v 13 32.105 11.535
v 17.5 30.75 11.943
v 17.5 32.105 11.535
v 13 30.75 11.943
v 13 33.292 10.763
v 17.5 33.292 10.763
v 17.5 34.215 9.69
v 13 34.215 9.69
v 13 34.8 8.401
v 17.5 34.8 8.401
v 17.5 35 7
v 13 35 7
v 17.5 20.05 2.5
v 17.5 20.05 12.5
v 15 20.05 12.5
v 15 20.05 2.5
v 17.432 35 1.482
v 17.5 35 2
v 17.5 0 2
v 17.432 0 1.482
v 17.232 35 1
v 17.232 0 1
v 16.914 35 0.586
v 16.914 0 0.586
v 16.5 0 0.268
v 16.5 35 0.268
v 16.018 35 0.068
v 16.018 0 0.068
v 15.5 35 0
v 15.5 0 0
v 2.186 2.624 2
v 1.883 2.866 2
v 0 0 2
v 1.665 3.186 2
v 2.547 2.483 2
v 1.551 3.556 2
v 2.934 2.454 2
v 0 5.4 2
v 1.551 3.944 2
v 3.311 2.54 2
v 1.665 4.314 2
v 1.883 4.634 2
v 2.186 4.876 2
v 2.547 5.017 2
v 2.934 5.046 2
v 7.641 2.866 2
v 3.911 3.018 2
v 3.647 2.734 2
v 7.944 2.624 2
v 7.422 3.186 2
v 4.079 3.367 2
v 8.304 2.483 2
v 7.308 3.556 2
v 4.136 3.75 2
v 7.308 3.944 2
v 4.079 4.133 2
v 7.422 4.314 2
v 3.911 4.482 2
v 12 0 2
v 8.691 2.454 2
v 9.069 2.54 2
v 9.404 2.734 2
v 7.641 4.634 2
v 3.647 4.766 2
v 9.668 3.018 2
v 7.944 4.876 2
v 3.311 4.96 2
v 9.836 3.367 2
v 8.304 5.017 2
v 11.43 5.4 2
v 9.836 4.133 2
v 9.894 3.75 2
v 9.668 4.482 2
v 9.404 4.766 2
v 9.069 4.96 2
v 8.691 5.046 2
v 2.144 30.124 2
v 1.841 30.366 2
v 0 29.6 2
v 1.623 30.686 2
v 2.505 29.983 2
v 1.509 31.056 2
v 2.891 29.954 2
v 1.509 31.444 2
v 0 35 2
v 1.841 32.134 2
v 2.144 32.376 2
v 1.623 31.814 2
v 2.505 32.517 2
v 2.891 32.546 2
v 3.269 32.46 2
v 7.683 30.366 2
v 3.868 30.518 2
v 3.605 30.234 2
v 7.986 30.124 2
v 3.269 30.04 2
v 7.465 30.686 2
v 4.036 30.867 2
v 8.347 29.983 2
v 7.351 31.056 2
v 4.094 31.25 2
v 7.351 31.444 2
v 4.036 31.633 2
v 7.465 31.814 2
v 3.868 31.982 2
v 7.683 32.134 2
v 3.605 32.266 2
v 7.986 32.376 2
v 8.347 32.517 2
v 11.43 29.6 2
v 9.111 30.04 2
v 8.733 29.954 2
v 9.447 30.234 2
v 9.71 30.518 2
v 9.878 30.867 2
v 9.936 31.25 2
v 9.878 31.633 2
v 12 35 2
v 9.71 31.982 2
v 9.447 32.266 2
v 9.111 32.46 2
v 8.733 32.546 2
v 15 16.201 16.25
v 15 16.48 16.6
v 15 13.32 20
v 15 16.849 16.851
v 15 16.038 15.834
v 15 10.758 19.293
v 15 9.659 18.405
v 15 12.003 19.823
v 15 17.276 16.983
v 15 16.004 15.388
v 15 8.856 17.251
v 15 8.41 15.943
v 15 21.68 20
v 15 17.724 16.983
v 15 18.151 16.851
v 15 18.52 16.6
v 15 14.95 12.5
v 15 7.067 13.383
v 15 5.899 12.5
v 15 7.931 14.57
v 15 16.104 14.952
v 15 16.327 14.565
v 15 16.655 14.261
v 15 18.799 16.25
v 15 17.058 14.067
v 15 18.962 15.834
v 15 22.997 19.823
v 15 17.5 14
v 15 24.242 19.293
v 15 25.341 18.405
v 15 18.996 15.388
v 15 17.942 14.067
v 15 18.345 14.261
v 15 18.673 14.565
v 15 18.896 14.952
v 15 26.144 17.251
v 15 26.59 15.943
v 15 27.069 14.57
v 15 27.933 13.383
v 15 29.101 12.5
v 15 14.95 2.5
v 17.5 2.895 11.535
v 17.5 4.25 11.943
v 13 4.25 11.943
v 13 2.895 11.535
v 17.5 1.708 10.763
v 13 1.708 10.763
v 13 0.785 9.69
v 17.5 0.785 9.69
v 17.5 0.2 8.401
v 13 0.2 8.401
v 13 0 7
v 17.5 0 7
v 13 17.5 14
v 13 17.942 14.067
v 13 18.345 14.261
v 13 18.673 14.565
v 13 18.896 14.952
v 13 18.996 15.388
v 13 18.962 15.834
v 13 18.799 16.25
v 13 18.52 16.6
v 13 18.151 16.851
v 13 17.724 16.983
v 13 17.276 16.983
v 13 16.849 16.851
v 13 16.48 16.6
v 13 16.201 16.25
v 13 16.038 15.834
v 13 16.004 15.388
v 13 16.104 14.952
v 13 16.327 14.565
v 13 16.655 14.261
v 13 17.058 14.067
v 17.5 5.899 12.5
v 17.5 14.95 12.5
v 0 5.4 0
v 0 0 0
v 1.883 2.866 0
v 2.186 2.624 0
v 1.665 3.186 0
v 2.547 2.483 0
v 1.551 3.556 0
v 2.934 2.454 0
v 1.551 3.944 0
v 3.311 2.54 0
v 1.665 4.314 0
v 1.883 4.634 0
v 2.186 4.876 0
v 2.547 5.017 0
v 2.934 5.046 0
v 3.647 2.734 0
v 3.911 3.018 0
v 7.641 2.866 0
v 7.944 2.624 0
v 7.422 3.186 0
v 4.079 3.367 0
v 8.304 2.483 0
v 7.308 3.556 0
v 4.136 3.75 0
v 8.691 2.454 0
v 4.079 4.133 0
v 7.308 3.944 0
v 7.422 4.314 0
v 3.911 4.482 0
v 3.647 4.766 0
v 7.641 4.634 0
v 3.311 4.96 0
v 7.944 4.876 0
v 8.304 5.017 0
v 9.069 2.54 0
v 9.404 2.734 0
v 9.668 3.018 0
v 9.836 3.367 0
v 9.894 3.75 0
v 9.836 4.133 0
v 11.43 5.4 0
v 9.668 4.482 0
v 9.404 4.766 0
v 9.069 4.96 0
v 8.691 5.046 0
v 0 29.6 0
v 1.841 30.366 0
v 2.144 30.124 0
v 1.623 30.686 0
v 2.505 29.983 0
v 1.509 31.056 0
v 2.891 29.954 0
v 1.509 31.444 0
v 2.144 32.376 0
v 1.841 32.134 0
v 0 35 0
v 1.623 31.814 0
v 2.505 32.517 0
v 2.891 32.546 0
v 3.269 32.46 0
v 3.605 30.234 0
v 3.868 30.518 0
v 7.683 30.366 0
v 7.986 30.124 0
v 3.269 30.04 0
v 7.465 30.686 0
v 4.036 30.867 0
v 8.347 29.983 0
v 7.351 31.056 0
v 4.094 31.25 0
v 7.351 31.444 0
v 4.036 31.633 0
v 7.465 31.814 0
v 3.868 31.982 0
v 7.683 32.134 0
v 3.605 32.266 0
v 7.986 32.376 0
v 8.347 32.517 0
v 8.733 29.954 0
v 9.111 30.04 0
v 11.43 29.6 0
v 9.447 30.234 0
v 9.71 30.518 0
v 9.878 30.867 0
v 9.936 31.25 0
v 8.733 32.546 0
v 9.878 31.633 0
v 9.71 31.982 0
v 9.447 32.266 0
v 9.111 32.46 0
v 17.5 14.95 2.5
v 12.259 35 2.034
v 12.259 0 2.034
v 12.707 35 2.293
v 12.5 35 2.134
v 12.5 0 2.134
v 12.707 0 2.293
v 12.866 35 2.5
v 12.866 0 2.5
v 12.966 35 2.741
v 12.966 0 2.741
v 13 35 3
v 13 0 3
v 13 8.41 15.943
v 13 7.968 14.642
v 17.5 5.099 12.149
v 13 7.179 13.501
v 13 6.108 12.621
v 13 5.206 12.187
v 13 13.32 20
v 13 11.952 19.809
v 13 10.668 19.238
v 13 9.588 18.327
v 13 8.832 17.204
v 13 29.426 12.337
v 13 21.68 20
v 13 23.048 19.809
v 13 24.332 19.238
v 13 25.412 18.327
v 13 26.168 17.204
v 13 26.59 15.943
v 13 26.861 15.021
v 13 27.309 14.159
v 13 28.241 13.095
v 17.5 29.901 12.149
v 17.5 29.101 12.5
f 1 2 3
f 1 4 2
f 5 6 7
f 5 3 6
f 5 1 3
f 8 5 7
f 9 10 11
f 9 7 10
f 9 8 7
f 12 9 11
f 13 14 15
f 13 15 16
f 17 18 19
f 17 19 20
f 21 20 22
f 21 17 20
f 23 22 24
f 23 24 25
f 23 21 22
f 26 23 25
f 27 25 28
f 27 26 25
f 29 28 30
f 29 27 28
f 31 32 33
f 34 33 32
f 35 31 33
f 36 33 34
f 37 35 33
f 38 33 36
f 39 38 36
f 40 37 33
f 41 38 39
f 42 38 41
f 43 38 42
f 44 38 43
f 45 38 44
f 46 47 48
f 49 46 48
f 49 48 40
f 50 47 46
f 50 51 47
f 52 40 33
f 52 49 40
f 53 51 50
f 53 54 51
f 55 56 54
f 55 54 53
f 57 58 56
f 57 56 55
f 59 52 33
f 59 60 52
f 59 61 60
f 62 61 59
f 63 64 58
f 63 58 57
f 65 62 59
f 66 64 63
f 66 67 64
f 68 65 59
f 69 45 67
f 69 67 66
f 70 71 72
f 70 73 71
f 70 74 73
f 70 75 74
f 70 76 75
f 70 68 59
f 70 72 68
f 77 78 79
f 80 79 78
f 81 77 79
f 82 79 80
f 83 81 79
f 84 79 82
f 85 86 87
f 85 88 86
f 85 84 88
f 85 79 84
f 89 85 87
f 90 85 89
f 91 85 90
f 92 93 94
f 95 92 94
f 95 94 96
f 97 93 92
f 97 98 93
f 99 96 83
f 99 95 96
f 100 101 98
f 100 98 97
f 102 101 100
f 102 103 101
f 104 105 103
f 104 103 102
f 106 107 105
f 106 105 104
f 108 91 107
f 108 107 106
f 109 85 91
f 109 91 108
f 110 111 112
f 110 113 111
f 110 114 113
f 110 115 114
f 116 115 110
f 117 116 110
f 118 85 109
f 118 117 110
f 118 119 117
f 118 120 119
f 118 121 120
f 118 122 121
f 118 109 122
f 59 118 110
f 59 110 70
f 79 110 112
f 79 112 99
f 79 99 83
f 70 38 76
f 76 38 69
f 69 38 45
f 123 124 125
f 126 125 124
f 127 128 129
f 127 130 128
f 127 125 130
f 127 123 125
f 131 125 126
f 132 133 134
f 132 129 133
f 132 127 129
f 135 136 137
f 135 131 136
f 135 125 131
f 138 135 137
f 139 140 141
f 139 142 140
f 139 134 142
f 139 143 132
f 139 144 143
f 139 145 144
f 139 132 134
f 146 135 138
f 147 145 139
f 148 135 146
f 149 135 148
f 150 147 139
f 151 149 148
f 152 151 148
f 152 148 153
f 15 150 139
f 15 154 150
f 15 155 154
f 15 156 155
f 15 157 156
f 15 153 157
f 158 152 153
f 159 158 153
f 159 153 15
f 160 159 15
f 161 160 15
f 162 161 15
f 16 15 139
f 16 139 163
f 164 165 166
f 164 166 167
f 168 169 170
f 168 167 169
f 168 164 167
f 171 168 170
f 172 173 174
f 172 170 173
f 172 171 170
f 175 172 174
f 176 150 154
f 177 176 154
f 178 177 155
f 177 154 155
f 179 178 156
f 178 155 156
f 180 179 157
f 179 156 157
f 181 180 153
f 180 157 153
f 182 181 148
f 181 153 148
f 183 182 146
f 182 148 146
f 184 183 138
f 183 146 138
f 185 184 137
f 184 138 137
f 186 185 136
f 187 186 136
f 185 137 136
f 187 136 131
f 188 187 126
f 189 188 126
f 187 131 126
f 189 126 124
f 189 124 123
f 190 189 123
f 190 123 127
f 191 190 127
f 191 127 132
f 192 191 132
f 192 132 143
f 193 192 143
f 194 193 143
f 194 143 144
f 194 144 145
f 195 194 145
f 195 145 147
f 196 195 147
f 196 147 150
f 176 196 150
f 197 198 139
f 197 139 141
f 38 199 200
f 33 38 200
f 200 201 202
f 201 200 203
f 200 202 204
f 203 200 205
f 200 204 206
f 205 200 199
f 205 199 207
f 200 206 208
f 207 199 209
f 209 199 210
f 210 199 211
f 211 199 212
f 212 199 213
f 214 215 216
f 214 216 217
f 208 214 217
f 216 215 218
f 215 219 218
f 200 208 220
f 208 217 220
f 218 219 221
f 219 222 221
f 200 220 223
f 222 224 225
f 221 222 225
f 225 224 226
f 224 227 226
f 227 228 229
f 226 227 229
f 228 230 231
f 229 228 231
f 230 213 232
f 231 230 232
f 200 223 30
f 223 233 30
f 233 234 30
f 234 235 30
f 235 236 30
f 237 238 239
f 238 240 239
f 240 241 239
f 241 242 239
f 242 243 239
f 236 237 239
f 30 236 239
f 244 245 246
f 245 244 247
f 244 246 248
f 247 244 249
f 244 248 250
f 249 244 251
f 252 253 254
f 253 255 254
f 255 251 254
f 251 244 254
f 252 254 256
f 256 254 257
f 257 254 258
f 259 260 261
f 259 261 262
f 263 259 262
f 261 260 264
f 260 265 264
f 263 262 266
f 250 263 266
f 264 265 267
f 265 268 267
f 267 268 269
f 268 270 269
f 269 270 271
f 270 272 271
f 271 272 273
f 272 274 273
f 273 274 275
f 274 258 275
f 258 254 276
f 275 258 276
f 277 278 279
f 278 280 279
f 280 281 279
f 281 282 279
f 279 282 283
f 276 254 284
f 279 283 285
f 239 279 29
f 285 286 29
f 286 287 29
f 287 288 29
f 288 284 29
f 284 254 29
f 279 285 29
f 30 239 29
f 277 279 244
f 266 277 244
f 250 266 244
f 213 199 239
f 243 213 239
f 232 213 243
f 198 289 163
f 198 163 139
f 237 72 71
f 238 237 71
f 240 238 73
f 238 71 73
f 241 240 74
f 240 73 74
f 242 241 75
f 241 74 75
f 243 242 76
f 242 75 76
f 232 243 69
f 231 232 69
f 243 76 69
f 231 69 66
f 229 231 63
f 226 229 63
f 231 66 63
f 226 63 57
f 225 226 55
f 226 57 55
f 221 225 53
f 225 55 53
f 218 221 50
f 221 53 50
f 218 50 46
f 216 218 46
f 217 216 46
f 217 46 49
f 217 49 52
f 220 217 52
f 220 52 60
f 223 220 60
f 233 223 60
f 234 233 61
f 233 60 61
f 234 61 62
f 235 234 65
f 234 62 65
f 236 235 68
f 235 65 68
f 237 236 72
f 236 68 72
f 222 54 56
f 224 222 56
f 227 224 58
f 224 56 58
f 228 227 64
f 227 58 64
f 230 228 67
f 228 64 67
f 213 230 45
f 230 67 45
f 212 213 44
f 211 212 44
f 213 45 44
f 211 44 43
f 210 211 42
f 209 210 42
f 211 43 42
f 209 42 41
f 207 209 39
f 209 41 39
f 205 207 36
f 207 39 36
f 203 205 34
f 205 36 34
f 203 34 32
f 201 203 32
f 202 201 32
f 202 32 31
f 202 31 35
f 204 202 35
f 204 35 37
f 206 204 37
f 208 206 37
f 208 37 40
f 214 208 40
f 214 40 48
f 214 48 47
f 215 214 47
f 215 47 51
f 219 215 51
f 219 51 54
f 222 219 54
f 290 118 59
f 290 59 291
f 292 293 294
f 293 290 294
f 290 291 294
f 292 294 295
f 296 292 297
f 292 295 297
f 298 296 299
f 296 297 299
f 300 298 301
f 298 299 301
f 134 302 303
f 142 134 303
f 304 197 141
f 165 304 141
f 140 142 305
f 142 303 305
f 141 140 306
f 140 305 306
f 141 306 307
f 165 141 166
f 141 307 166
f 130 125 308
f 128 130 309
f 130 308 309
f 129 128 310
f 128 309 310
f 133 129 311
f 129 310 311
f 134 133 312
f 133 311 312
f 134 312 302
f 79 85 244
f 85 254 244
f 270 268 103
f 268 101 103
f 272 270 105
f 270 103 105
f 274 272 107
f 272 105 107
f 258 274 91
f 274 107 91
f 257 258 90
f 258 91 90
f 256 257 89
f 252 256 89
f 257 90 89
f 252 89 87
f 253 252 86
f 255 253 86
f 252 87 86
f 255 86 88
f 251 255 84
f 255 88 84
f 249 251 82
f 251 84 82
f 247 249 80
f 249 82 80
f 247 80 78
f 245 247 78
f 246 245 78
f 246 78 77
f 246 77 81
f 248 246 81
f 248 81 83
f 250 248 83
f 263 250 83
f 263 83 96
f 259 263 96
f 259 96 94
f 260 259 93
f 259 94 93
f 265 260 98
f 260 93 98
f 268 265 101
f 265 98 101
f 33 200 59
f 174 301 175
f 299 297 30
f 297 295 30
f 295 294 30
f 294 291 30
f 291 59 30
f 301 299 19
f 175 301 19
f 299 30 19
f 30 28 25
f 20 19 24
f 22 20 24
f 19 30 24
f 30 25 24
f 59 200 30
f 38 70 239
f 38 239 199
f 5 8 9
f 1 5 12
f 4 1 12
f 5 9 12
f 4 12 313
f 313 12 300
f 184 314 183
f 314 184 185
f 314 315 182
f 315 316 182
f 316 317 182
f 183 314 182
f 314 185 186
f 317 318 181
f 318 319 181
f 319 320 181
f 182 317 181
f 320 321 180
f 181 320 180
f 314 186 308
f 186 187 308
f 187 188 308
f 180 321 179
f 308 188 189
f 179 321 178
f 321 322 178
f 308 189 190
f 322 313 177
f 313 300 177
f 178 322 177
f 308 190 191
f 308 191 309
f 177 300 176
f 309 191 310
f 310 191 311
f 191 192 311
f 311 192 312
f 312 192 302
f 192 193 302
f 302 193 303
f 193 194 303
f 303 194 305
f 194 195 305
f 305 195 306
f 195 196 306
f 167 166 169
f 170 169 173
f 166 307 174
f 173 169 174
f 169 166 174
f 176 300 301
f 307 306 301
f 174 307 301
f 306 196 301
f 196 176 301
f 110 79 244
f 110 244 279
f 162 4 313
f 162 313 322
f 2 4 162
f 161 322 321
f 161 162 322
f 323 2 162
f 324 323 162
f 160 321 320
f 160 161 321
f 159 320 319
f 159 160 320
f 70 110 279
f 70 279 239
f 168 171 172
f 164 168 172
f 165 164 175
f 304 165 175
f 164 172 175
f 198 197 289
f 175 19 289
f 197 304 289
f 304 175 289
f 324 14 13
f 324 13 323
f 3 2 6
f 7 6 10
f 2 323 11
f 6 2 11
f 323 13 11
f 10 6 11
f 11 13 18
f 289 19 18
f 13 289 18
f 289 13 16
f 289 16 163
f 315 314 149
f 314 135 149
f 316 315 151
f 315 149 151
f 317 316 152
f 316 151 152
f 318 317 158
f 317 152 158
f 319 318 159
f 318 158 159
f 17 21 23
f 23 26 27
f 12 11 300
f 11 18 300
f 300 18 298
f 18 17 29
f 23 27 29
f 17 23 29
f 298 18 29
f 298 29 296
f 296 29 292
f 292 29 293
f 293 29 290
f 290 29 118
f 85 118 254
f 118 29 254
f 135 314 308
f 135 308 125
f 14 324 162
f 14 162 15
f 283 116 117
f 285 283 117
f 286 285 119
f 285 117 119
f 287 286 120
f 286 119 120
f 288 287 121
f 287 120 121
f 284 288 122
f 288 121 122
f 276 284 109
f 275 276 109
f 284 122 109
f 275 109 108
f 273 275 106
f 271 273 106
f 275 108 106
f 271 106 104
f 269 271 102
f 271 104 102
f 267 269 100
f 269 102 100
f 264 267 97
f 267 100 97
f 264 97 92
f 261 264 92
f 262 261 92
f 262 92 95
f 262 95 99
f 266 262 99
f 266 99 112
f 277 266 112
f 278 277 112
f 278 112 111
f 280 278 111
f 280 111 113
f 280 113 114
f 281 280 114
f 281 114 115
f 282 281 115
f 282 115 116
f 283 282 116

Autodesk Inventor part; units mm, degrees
ref_plane "YZ Plane" through (0, 0, 0) normal (1, 0, 0) x (0, 1, 0)
ref_plane "XZ Plane" through (0, 0, 0) normal (0, 1, 0) x (-1, 0, 0)
ref_plane "XY Plane" through (0, 0, 0) normal (0, 0, 1) x (1, 0, 0)
sketch "Esquisse1" plane through (0, 0, 0) normal (0, 0, 1) x (1, 0, 0)
  line L0 (0, 0) -> (17.5, 0)
  line L1 (17.5, 0) -> (17.5, 35)
  line L2 (17.5, 35) -> (0, 35)
  line L3 (0, 35) -> (0, 0)
  dimension "d0" = 35
  dimension "d1" = 17.5
extrude "Extrusion1" add sketch "Esquisse1" along normal blind 2
sketch "Esquisse2" plane through (0, 0, 2) normal (0, 0, 1) x (1, 0, 0)
  line L0 (0, 0) -> (17.5, 0) projected
  line L1 (17.5, 35) -> (0, 35) projected
  line L2 (0, 35) -> (0, 0) projected
  line L3 (0, 29.6) -> (11.43, 29.6)
  line L4 (11.43, 29.6) -> (11.43, 5.4)
  line L5 (11.43, 5.4) -> (0, 5.4)
  line L6 (0, 5.4) -> (0, 29.6)
  line L7 (11.43, 29.6) -> (11.43, 35) construction
  line L8 (11.43, 5.4) -> (11.43, 0) construction
  circle A0 centre (2.794, 31.25) radius 1.3
  circle A1 centre (8.636, 31.25) radius 1.3
  line L9 (11.43, 17.5) -> (0, 17.5) construction
  circle A2 centre (2.8364, 3.75) radius 1.3
  circle A3 centre (8.5936, 3.75) radius 1.3
  line L10 (8.5936, 3.75) -> (2.8364, 3.75) construction
  line L11 (8.636, 31.25) -> (2.794, 31.25) construction
  line L12 (5.715, 31.25) -> (5.715, 17.5) construction
  line L13 (5.715, 17.5) -> (5.715, 3.75) construction
  line L14 (2.794, 31.25) -> (0, 31.25) construction
  line L15 (8.636, 31.25) -> (11.43, 31.25) construction
  dimension "d4" = 24.2
  dimension "d6" = 11.43
  dimension "d7" = 5.842
  dimension "d8" = 27.5
  dimension "d9" = 2.6
extrude "Extrusion2" cut sketch "Esquisse2" against normal blind 4.5
sketch "Esquisse3" plane through (0, 0, 2) normal (0, 0, 1) x (1, 0, 0)
  line L0 (0, 0) -> (17.5, 0) projected
  line L1 (17.5, 35) -> (13, 35)
  line L2 (13, 35) -> (13, 0)
  line L3 (13, 0) -> (17.5, 0)
  line L4 (17.5, 0) -> (17.5, 35)
  dimension "d12" = 4.5
extrude "Extrusion3" add sketch "Esquisse3" along normal blind 10
sketch "Esquisse6" plane through (0, 0, 12) normal (0, 0, 1) x (1, 0, 0)
  line L0 (13, 0) -> (17.5, 0) construction
  line L1 (17.5, 0) -> (17.5, 35) construction
  line L2 (17.5, 35) -> (13, 35) construction
  line L3 (13, 35) -> (13, 0) construction
  line L4 (13, 26.5) -> (17.5, 26.5)
  line L5 (17.5, 26.5) -> (17.5, 8.5)
  line L6 (17.5, 8.5) -> (13, 8.5)
  line L7 (13, 8.5) -> (13, 26.5)
  line L8 (15.25, 26.5) -> (15.25, 35) construction
  line L9 (15.25, 8.5) -> (15.25, 0) construction
  point P0 (0, 0)
  dimension "d28" = 18
extrude "Extrusion6" add sketch "Esquisse6" along normal blind 8
fillet "Congé2" radius 5 2 edges at (15.25, 0, 12) (15.25, 35, 12)
fillet "Congé3" radius 5 4 edges at (15.25, 26.5, 12) (15.25, 8.5, 12) (15.25, 26.5, 20) (15.25, 8.5, 20)
sketch "Esquisse4" plane through (17.5, 0, 0) normal (1, 0, 0) x (0, 0, -1)
  line L0 (0, 0) -> (0, 35) construction
  line L1 (0, 35) -> (-12, 35) construction
  line L2 (0, 0) -> (-12, 0) construction
  line L3 (-27.5, 30.05) -> (-12.5, 30.05)
  line L4 (-12.5, 30.05) -> (-12.5, 20.05)
  line L5 (-12.5, 20.05) -> (-2.5, 20.05)
  line L6 (-2.5, 20.05) -> (-2.5, 14.95)
  line L7 (-2.5, 14.95) -> (-12.5, 14.95)
  line L8 (-12.5, 14.95) -> (-12.5, 4.95)
  line L9 (-12.5, 4.95) -> (-27.5, 4.95)
  line L10 (-27.5, 4.95) -> (-27.5, 30.05)
  line L11 (-7.5, 20.05) -> (-7.5, 35) construction
  line L12 (-7.5, 14.95) -> (-7.5, 0) construction
  dimension "d15" = 10
  dimension "d17" = 5.1
  dimension "d18" = 2.5
  dimension "d19" = 15
extrude "Extrusion4" cut sketch "Esquisse4" against normal blind 2.5
sketch "Esquisse5" plane through (15, 0, 0) normal (1, 0, 0) x (0, 0, -1)
  line L0 (-12.5, 29.1009) -> (-12.5, 20.05) construction
  circle A0 centre (-15.5, 17.5) radius 1.5
  line L1 (-15.5, 17.5) -> (-12.5, 20.05) construction
  line L2 (-15.5, 17.5) -> (-12.5, 14.95) construction
  point P0 (-12.5, 4.95)
  point P1 (-12.5, 30.05)
  point P2 (0, 0)
  point P3 (-12.5, 29)
  dimension "d22" = 3
  dimension "d23" = 3
extrude "Extrusion5" cut sketch "Esquisse5" against normal up to next
fillet "Congé1" radius 2 1 edges at (17.5, 17.5, 0)
fillet "Congé4" radius 1 1 edges at (13, 17.5, 2)
properties part number "Pantilt"
